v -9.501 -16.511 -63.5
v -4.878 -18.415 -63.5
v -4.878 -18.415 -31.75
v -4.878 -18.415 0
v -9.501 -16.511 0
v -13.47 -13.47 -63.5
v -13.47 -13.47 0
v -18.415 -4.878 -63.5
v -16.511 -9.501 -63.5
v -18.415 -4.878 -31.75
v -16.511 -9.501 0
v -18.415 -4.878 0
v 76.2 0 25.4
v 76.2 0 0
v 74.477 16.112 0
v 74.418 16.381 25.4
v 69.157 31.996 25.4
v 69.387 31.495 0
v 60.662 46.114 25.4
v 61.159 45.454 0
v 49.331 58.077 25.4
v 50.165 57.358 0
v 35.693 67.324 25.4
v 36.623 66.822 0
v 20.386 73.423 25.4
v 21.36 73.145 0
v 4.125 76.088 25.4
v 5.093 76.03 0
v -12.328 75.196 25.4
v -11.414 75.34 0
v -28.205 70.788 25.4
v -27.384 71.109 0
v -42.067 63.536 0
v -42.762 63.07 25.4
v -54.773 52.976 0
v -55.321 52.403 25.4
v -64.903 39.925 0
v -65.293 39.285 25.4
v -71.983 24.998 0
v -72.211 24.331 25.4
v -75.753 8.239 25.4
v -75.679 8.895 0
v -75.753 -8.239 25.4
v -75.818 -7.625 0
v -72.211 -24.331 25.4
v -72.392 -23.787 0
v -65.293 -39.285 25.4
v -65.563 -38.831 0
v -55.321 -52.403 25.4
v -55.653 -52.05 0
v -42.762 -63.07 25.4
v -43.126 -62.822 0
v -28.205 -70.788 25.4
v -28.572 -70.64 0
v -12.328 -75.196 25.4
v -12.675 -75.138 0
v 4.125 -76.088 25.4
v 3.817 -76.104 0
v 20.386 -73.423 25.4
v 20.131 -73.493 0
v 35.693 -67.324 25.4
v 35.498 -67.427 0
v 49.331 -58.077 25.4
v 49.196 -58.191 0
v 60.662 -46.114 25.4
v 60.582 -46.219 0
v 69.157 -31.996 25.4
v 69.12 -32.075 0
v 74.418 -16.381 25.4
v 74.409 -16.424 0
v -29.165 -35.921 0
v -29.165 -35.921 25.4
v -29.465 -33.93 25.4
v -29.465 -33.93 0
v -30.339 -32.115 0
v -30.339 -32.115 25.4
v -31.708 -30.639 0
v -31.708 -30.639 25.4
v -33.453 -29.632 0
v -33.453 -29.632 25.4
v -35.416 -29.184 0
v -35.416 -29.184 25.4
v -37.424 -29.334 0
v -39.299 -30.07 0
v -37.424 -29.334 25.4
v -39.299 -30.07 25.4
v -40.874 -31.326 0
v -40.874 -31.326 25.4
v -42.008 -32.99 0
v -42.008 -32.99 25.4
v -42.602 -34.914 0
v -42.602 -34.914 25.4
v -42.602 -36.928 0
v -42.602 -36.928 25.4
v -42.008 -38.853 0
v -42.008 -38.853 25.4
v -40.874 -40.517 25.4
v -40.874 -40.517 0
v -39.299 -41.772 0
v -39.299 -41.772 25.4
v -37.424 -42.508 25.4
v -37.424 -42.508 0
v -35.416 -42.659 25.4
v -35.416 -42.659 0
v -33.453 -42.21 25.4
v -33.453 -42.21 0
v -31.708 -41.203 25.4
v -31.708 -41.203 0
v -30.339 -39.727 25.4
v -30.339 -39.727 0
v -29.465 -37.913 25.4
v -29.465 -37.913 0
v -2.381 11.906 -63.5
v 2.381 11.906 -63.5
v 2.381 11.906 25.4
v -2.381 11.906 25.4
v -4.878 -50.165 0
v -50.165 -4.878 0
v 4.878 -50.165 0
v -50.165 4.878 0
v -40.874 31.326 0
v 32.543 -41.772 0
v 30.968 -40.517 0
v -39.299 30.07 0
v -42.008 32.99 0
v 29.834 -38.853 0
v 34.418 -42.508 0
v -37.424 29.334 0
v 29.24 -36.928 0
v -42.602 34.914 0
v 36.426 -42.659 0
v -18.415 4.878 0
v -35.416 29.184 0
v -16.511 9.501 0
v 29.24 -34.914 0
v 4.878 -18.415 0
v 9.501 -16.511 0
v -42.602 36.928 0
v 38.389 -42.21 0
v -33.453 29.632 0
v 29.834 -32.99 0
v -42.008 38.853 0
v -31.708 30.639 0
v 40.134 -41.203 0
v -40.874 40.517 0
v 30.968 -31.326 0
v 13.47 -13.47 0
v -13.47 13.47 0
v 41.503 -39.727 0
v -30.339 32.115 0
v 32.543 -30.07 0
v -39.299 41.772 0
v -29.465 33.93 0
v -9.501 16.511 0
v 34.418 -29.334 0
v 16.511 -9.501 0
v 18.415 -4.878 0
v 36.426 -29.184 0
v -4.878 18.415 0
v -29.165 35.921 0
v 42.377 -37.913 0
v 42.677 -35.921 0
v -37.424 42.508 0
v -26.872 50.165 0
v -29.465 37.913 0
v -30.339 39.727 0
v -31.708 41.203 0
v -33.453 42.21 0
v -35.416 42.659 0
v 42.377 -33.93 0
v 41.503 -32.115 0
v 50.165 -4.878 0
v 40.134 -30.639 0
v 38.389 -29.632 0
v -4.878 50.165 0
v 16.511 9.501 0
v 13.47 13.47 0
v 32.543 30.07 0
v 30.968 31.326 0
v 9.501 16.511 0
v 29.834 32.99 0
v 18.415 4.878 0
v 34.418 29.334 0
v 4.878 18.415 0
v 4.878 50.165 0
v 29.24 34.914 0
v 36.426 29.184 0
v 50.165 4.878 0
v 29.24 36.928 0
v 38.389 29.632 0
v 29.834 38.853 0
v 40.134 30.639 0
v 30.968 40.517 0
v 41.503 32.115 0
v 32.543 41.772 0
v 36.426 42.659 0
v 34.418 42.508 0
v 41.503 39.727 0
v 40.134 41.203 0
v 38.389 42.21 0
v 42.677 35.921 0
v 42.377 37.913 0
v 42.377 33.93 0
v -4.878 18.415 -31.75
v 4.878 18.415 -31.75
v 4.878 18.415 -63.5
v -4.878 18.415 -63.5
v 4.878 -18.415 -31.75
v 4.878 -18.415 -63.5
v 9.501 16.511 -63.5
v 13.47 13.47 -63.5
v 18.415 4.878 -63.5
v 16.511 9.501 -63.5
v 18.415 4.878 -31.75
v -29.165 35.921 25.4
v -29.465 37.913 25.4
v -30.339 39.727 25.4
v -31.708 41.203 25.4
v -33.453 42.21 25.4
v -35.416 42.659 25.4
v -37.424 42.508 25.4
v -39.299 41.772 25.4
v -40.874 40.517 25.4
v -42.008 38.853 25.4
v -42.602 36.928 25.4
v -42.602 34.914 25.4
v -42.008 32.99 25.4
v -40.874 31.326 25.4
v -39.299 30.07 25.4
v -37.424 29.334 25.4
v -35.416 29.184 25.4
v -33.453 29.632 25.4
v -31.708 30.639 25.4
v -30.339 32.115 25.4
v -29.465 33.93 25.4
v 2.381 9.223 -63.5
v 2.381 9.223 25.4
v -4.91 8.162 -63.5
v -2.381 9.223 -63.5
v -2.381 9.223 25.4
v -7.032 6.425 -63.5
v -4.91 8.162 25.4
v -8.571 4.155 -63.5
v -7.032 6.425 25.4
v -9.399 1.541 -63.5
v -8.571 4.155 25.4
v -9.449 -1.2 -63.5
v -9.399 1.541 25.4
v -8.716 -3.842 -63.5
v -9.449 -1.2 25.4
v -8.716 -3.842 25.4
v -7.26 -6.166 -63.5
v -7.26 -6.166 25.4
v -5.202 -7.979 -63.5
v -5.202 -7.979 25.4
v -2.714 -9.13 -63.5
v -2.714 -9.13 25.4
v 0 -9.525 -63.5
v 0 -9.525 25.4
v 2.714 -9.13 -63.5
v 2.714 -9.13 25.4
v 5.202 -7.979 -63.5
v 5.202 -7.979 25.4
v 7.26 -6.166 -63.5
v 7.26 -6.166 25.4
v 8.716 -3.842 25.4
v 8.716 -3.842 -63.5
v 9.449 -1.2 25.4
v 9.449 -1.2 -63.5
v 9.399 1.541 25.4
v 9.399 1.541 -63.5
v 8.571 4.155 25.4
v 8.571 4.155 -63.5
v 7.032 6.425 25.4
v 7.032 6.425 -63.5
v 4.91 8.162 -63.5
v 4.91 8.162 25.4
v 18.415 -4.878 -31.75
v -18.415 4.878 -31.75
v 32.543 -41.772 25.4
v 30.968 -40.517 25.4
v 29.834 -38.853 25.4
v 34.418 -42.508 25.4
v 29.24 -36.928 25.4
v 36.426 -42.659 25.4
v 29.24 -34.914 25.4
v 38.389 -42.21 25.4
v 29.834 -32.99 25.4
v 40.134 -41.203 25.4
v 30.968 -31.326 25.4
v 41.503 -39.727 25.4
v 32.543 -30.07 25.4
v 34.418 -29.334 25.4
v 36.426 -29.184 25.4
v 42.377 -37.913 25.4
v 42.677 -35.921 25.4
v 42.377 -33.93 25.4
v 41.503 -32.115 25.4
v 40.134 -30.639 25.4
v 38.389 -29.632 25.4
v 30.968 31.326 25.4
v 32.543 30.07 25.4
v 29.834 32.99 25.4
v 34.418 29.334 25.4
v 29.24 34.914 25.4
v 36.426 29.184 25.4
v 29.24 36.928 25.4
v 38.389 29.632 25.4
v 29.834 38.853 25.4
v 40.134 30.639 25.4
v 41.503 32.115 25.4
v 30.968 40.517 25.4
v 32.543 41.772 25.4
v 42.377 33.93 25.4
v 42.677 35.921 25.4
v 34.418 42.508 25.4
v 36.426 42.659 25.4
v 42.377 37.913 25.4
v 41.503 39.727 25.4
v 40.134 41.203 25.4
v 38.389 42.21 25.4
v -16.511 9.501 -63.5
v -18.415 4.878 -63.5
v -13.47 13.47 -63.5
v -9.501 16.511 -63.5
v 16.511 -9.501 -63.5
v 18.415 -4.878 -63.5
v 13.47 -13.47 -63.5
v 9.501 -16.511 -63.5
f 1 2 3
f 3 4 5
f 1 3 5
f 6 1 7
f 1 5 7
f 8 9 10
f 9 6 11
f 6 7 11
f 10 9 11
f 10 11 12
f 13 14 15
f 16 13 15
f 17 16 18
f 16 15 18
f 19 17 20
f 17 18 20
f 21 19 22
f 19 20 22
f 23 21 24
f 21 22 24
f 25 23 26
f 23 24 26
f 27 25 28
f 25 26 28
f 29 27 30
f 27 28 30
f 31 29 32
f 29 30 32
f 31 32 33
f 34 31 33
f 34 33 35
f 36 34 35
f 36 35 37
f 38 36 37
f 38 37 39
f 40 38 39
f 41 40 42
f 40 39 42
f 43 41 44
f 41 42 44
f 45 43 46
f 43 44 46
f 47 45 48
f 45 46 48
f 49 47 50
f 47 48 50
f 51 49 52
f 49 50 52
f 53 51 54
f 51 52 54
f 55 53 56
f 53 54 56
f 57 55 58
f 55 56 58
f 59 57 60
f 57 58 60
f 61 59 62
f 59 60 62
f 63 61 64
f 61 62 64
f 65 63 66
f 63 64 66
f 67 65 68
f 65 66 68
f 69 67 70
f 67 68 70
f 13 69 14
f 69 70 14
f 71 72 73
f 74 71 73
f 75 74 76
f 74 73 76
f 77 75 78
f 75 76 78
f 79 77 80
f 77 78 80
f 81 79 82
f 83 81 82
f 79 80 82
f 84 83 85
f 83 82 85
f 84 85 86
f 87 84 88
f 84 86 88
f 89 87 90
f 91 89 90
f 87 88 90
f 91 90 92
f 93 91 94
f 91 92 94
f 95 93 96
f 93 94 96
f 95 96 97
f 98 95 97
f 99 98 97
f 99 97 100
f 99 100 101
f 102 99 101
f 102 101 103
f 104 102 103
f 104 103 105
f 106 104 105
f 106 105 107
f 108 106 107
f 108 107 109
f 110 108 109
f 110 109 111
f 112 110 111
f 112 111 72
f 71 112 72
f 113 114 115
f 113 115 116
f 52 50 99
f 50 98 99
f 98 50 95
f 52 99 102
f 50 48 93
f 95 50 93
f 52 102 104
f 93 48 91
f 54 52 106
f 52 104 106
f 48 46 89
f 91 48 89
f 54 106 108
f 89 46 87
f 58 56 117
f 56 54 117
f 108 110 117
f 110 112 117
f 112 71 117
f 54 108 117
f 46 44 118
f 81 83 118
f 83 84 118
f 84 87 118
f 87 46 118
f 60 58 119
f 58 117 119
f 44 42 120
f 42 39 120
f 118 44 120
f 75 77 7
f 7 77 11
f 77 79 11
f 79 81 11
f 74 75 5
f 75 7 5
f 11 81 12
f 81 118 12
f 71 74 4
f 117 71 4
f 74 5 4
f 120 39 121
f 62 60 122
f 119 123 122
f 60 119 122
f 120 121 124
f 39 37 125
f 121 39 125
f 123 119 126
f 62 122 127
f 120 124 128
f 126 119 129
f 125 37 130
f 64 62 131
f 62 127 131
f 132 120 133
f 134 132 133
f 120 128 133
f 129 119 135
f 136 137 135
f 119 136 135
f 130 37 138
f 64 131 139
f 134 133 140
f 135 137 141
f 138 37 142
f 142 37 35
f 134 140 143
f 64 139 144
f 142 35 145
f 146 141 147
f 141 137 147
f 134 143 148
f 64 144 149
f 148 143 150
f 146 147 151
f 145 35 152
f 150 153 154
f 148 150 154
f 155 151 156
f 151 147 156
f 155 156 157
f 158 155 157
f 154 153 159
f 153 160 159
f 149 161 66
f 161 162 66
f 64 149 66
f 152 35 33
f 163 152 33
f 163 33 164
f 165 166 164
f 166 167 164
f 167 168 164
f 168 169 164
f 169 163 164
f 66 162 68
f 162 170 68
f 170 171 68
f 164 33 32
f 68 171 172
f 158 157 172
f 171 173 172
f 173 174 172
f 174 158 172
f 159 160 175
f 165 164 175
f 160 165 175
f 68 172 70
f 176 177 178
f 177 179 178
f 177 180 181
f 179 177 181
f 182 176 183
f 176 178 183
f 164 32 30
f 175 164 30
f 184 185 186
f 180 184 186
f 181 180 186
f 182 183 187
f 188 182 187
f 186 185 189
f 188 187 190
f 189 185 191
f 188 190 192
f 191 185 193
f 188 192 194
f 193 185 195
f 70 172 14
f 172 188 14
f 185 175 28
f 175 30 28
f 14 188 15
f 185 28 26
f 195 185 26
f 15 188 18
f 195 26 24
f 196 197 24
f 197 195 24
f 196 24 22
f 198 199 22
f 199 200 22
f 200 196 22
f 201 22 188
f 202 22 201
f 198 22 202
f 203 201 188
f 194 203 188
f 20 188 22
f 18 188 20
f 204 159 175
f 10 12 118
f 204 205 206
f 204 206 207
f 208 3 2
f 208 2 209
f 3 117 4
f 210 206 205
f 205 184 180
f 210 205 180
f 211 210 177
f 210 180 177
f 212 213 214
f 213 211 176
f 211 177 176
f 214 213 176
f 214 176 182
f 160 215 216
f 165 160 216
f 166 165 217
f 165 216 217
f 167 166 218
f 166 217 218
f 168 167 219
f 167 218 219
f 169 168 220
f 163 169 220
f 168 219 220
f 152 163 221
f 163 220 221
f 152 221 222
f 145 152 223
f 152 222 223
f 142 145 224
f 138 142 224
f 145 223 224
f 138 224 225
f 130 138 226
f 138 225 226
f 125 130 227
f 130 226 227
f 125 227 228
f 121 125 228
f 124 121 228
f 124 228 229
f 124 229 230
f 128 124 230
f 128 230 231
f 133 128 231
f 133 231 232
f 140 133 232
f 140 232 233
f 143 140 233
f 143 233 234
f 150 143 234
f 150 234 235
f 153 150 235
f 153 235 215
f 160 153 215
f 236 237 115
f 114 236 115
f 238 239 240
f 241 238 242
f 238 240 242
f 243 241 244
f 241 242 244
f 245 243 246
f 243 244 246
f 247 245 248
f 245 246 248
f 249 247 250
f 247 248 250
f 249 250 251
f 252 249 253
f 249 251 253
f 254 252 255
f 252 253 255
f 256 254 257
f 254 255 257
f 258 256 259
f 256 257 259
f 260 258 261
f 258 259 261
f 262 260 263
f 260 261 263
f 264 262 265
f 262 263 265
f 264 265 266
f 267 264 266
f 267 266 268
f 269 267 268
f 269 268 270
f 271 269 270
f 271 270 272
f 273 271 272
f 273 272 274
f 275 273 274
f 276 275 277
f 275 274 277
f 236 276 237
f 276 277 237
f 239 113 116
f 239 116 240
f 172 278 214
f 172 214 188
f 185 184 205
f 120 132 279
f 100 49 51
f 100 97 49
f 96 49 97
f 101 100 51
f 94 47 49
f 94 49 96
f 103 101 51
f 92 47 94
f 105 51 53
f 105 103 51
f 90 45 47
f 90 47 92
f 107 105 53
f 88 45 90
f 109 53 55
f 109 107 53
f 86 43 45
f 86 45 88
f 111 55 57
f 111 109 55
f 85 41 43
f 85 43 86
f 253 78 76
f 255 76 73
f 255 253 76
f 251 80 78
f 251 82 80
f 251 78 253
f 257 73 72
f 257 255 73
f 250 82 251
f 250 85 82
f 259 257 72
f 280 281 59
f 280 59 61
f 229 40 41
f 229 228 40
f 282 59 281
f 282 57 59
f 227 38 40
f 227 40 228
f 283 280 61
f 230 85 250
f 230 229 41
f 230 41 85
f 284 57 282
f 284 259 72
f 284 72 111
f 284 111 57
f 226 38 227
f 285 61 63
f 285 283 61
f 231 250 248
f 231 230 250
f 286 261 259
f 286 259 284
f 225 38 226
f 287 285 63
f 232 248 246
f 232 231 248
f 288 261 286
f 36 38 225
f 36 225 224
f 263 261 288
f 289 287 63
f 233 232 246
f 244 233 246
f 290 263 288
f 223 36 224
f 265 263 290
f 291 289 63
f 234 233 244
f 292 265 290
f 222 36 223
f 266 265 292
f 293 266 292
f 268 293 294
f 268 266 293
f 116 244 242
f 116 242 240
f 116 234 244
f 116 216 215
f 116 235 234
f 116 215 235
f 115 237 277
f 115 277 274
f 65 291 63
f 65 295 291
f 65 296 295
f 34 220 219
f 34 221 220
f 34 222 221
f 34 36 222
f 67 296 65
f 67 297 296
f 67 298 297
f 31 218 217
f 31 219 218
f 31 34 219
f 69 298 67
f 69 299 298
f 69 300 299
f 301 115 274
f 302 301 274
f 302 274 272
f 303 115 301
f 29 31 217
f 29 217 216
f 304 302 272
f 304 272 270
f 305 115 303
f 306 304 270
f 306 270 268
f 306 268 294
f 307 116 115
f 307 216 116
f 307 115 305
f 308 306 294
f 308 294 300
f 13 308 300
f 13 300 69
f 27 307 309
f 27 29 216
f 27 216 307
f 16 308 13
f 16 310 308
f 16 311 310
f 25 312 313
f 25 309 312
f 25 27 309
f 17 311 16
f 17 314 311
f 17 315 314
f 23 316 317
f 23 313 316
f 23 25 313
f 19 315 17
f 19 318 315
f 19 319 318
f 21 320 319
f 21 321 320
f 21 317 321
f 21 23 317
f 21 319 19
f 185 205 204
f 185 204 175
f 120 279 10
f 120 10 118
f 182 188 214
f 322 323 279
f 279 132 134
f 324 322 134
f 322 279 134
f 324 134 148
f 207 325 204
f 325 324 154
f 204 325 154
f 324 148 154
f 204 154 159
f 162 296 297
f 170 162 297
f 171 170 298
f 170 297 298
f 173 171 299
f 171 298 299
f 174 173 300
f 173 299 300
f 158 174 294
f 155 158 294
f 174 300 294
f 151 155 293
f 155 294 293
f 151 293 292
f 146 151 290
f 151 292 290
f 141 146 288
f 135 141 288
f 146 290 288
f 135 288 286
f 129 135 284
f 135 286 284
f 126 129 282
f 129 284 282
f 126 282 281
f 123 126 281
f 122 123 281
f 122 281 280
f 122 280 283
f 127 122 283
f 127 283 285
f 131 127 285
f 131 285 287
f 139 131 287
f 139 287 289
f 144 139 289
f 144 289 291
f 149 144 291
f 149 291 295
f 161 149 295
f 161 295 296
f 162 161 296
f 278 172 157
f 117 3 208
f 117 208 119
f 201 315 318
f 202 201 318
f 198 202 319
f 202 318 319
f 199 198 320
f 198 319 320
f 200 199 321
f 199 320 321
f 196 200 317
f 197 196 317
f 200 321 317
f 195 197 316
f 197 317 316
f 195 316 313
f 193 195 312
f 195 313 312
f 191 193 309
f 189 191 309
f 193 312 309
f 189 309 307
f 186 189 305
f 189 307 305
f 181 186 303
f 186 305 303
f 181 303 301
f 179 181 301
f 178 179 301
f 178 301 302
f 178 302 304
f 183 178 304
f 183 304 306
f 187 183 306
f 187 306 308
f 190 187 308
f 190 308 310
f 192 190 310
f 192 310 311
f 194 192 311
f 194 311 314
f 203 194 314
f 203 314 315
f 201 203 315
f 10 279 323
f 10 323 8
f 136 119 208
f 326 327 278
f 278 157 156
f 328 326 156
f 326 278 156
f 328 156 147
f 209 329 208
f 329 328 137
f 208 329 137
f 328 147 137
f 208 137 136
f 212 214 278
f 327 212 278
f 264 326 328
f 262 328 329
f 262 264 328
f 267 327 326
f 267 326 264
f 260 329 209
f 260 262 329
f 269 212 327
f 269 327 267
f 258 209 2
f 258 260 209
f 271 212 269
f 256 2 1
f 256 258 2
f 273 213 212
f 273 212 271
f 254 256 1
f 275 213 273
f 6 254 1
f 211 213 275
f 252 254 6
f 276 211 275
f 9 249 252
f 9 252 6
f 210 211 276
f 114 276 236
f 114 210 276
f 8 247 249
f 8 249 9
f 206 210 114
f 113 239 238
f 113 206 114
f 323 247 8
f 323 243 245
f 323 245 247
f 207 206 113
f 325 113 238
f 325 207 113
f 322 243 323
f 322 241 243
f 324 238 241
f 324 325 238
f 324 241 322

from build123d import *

# Parameters (mm, degrees)
SKETCH1_R            = 76.2
BOSS_EXTRUDE1_DEPTH  = 25.4
SKETCH2_R            = 19.05
BOSS_EXTRUDE2_DEPTH  = 63.5
CUT_EXTRUDE1_START   = -63.5
CUT_EXTRUDE1_DEPTH   = 63.5
SKETCH6_W            = 9.7550551
SKETCH6_H            = 31.75
BOSS_EXTRUDE7_DEPTH  = 31.75
CUT_EXTRUDE2_DEPTH   = 31.75
SKETCH8_R            = 9.525
CUT_EXTRUDE3_DEPTH   = 140.7
CUT_EXTRUDE4_DEPTH   = 140.7
SKETCH11_W           = 9.7550551
SKETCH11_H           = 31.75
BOSS_EXTRUDE8_DEPTH  = 31.75
CUT_EXTRUDE5_DEPTH   = 129.110325398
SKETCH13_W           = 31.75
SKETCH13_H           = 9.7550551
BOSS_EXTRUDE9_DEPTH  = 31.75
CUT_EXTRUDE6_DEPTH   = 129.110325398
SKETCH15_W           = 31.75
SKETCH15_H           = 9.7550551
BOSS_EXTRUDE10_DEPTH = 31.75
CUT_EXTRUDE7_DEPTH   = 129.110325398
SKETCH17_R           = 6.7564
CUT_EXTRUDE8_DEPTH   = 140.7


with BuildPart() as part:
    # Sketch1 → Boss-Extrude1 (new body)
    with BuildSketch(Plane.XY):
        Circle(SKETCH1_R)
    extrude(amount=BOSS_EXTRUDE1_DEPTH)

    # Sketch2 → Boss-Extrude2 (add)
    with BuildSketch(Plane(origin=(0, 0, 0), x_dir=(-1, 0, 0), z_dir=(0, 0, -1))):
        Circle(SKETCH2_R)
    extrude(amount=BOSS_EXTRUDE2_DEPTH)

    # Sketch4 → Cut-Extrude1 (cut)
    with BuildSketch(Plane(origin=(0, 0, -63.5), x_dir=(-1, 0, 0), z_dir=(0, 0, -1)).offset(CUT_EXTRUDE1_START)):
        with BuildLine():
            Line((-4.87752755, 18.415), (4.87752755, 18.415))
            ThreePointArc((4.87752755, 18.415), (0, 19.05), (-4.87752755, 18.415))
        make_face()
        with BuildLine():
            Line((-18.415, 4.87752755), (-18.415, -4.87752755))
            ThreePointArc((-18.415, -4.87752755), (-19.05, 0), (-18.415, 4.87752755))
        make_face()
        with BuildLine():
            Line((4.87752755, -18.415), (-4.87752755, -18.415))
            ThreePointArc((-4.87752755, -18.415), (0, -19.05), (4.87752755, -18.415))
        make_face()
        with BuildLine():
            Line((18.415, 4.87752755), (18.415, -4.87752755))
            ThreePointArc((18.415, -4.87752755), (19.05, 0), (18.415, 4.87752755))
        make_face()
    extrude(amount=CUT_EXTRUDE1_DEPTH, mode=Mode.SUBTRACT)

    # Sketch6 → Boss-Extrude7 (add)
    with BuildSketch(Plane(origin=(0, 0, 0), x_dir=(-1, 0, 0), z_dir=(0, 0, -1))):
        with Locations((0, 34.29)):
            Rectangle(SKETCH6_W, SKETCH6_H)
    extrude(amount=BOSS_EXTRUDE7_DEPTH)

    # Sketch7 → Cut-Extrude2 (cut)
    with BuildSketch(Plane(origin=(4.87752755, 0, 0), x_dir=(0, 0, -1), z_dir=(1, 0, 0))):
        Polygon((31.75, 18.415), (0, 50.165), (31.75, 50.165), align=None)
    extrude(amount=-CUT_EXTRUDE2_DEPTH, mode=Mode.SUBTRACT)

    # Sketch8 → Cut-Extrude3 (cut, through all)
    with BuildSketch(Plane.XY.offset(25.4)):
        Circle(SKETCH8_R)
    extrude(amount=-CUT_EXTRUDE3_DEPTH, mode=Mode.SUBTRACT)

    # Sketch9 → Cut-Extrude4 (cut, through all)
    with BuildSketch(Plane.XY.offset(25.4)):
        with BuildLine():
            Line((-2.38125, 11.90625), (-2.38125, 9.222541593))
            ThreePointArc((-2.38125, 9.222541593), (0, 9.525), (2.38125, 9.222541593))
            Line((2.38125, 9.222541593), (2.38125, 11.90625))
            Line((2.38125, 11.90625), (-2.38125, 11.90625))
        make_face()
    extrude(amount=-CUT_EXTRUDE4_DEPTH, mode=Mode.SUBTRACT)

    # Sketch11 → Boss-Extrude8 (add)
    with BuildSketch(Plane(origin=(0, 0, 0), x_dir=(-1, 0, 0), z_dir=(0, 0, -1))):
        with Locations((0, -34.29)):
            Rectangle(SKETCH11_W, SKETCH11_H)
    extrude(amount=BOSS_EXTRUDE8_DEPTH)

    # Sketch12 → Cut-Extrude5 (cut, through all)
    with BuildSketch(Plane.ZY.offset(4.87752755)):
        Polygon((-31.75, -18.415), (0, -50.165), (-31.75, -50.165), align=None)
    extrude(amount=-CUT_EXTRUDE5_DEPTH, mode=Mode.SUBTRACT)

    # Sketch13 → Boss-Extrude9 (add)
    with BuildSketch(Plane(origin=(0, 0, 0), x_dir=(-1, 0, 0), z_dir=(0, 0, -1))):
        with Locations((34.29, 0)):
            Rectangle(SKETCH13_W, SKETCH13_H)
    extrude(amount=BOSS_EXTRUDE9_DEPTH)

    # Sketch14 → Cut-Extrude6 (cut, through all)
    with BuildSketch(Plane(origin=(0, 4.87752755, 0), x_dir=(1, 0, 0), z_dir=(0, 1, 0))):
        Polygon((-18.415, 31.75), (-50.165, 0), (-50.165, 31.75), align=None)
    extrude(amount=-CUT_EXTRUDE6_DEPTH, mode=Mode.SUBTRACT)

    # Sketch15 → Boss-Extrude10 (add)
    with BuildSketch(Plane(origin=(0, 0, 0), x_dir=(-1, 0, 0), z_dir=(0, 0, -1))):
        with Locations((-34.29, 0)):
            Rectangle(SKETCH15_W, SKETCH15_H)
    extrude(amount=BOSS_EXTRUDE10_DEPTH)

    # Sketch16 → Cut-Extrude7 (cut, through all)
    with BuildSketch(Plane.XZ.offset(4.87752755)):
        Polygon((18.415, -31.75), (50.165, 0), (50.165, -31.75), align=None)
    extrude(amount=-CUT_EXTRUDE7_DEPTH, mode=Mode.SUBTRACT)

    # Sketch17 → Cut-Extrude8 (cut, through all)
    with BuildSketch(Plane.XY.offset(25.4)):
        with Locations((35.921024484, 35.921024484)):
            Circle(SKETCH17_R)
        with Locations((-35.921024484, -35.921024484)):
            Circle(SKETCH17_R)
        with Locations((-35.921024484, 35.921024484)):
            Circle(SKETCH17_R)
        with Locations((35.921024484, -35.921024484)):
            Circle(SKETCH17_R)
    extrude(amount=-CUT_EXTRUDE8_DEPTH, mode=Mode.SUBTRACT)


solid = part.part
